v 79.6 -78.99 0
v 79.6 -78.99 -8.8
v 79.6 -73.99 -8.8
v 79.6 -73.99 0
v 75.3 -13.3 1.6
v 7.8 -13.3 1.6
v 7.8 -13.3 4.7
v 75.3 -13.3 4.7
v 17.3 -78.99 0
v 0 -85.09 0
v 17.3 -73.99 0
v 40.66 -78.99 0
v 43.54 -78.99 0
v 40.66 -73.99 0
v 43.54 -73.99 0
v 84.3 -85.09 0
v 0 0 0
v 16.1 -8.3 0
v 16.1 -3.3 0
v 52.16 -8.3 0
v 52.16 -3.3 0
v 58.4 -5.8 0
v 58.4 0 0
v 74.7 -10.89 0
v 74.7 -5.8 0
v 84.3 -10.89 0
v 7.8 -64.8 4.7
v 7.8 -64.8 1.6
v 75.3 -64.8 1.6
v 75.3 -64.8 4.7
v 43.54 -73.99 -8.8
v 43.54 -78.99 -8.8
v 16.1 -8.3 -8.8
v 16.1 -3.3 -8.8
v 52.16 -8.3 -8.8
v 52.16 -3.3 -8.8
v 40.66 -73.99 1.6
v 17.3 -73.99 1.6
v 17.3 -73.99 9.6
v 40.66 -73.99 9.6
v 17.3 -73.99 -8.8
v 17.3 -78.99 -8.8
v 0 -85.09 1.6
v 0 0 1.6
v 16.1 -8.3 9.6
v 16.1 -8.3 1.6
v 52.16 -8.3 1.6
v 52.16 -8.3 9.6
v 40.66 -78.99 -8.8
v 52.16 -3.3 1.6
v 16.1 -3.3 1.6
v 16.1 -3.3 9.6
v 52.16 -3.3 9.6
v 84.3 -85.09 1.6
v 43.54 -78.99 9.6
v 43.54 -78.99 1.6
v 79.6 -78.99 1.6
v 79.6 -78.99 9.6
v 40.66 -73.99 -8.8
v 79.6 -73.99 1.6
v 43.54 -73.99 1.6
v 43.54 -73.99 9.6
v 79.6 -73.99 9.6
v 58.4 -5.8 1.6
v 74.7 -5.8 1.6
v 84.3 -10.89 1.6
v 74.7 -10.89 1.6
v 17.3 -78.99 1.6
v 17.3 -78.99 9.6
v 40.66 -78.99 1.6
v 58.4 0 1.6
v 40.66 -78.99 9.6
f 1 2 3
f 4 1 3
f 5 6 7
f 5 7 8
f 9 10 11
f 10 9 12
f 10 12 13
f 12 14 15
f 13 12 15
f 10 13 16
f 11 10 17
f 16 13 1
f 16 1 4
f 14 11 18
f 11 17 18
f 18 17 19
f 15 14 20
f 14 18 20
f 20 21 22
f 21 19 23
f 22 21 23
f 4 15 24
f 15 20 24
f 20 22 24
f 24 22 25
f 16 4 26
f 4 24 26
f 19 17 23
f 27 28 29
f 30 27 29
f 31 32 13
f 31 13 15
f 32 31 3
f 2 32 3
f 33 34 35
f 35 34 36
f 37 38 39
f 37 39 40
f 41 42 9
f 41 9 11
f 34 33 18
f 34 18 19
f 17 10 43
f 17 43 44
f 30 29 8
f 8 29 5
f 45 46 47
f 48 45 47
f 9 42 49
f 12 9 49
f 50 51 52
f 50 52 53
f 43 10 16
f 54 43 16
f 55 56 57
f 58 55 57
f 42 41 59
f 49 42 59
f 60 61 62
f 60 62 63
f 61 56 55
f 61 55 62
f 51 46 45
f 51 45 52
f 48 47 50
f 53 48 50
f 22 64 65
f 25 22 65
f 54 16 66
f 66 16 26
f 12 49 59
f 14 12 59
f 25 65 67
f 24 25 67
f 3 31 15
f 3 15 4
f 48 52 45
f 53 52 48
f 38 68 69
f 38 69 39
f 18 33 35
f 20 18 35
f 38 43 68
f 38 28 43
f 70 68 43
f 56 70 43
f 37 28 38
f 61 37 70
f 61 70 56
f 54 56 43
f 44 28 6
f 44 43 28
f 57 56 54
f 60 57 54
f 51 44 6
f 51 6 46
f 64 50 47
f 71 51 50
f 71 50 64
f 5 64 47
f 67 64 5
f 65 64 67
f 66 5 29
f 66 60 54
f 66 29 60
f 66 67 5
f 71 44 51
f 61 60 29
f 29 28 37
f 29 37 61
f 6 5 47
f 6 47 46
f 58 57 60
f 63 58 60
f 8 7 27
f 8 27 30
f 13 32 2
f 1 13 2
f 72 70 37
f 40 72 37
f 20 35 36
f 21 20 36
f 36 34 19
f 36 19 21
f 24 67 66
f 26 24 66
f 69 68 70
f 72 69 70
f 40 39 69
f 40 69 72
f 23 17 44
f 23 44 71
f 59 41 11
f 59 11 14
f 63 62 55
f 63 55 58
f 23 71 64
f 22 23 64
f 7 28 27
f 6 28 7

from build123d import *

# Parameters (mm, degrees)
SKETCH1_W                = 84.3
SKETCH1_H                = 85.09
BOSS_EXTRUDE1_DEPTH      = 1.6
SKETCH2_W                = 67.5
SKETCH2_H                = 51.5
BOSS_EXTRUDE2_DEPTH      = 3.1
CUT_EXTRUDE1_DEPTH       = 120.818229414
BOSS_EXTRUDE3_DEPTH      = 8
BOSS_EXTRUDE3_DEPTH_BACK = 10.4
SKETCH4_W                = 23.36
SKETCH4_H                = 5
SKETCH4_W_2              = 36.06


with BuildPart() as part:
    # Sketch1 → Boss-Extrude1 (new body)
    with BuildSketch(Plane.XY):
        with Locations((42.15, -42.545)):
            Rectangle(SKETCH1_W, SKETCH1_H)
    extrude(amount=BOSS_EXTRUDE1_DEPTH)

    # Sketch2 → Boss-Extrude2 (add)
    with BuildSketch(Plane.XY.offset(1.6)):
        with Locations((41.55, -39.05)):
            Rectangle(SKETCH2_W, SKETCH2_H)
    extrude(amount=BOSS_EXTRUDE2_DEPTH)

    # Sketch3 → Cut-Extrude1 (cut, through all)
    with BuildSketch(Plane.XY.offset(1.6)):
        Polygon((84.3, 0), (58.4, 0), (58.4, -5.8), (74.7, -5.8), (74.7, -10.89), (84.3, -10.89), align=None)
    extrude(amount=-CUT_EXTRUDE1_DEPTH, mode=Mode.SUBTRACT)

    # Sketch4 → Boss-Extrude3 (add, two sides: drawn at the far end of the back side and taken through both)
    with BuildSketch(Plane.XY.offset(1.6).offset(-BOSS_EXTRUDE3_DEPTH_BACK)):
        with Locations((28.98, -76.49)):
            Rectangle(SKETCH4_W, SKETCH4_H)
        with Locations((61.57, -76.49)):
            Rectangle(SKETCH4_W_2, SKETCH4_H)
        with Locations((34.13, -5.8)):
            Rectangle(SKETCH4_W_2, SKETCH4_H)
    extrude(amount=BOSS_EXTRUDE3_DEPTH + BOSS_EXTRUDE3_DEPTH_BACK)


solid = part.part
